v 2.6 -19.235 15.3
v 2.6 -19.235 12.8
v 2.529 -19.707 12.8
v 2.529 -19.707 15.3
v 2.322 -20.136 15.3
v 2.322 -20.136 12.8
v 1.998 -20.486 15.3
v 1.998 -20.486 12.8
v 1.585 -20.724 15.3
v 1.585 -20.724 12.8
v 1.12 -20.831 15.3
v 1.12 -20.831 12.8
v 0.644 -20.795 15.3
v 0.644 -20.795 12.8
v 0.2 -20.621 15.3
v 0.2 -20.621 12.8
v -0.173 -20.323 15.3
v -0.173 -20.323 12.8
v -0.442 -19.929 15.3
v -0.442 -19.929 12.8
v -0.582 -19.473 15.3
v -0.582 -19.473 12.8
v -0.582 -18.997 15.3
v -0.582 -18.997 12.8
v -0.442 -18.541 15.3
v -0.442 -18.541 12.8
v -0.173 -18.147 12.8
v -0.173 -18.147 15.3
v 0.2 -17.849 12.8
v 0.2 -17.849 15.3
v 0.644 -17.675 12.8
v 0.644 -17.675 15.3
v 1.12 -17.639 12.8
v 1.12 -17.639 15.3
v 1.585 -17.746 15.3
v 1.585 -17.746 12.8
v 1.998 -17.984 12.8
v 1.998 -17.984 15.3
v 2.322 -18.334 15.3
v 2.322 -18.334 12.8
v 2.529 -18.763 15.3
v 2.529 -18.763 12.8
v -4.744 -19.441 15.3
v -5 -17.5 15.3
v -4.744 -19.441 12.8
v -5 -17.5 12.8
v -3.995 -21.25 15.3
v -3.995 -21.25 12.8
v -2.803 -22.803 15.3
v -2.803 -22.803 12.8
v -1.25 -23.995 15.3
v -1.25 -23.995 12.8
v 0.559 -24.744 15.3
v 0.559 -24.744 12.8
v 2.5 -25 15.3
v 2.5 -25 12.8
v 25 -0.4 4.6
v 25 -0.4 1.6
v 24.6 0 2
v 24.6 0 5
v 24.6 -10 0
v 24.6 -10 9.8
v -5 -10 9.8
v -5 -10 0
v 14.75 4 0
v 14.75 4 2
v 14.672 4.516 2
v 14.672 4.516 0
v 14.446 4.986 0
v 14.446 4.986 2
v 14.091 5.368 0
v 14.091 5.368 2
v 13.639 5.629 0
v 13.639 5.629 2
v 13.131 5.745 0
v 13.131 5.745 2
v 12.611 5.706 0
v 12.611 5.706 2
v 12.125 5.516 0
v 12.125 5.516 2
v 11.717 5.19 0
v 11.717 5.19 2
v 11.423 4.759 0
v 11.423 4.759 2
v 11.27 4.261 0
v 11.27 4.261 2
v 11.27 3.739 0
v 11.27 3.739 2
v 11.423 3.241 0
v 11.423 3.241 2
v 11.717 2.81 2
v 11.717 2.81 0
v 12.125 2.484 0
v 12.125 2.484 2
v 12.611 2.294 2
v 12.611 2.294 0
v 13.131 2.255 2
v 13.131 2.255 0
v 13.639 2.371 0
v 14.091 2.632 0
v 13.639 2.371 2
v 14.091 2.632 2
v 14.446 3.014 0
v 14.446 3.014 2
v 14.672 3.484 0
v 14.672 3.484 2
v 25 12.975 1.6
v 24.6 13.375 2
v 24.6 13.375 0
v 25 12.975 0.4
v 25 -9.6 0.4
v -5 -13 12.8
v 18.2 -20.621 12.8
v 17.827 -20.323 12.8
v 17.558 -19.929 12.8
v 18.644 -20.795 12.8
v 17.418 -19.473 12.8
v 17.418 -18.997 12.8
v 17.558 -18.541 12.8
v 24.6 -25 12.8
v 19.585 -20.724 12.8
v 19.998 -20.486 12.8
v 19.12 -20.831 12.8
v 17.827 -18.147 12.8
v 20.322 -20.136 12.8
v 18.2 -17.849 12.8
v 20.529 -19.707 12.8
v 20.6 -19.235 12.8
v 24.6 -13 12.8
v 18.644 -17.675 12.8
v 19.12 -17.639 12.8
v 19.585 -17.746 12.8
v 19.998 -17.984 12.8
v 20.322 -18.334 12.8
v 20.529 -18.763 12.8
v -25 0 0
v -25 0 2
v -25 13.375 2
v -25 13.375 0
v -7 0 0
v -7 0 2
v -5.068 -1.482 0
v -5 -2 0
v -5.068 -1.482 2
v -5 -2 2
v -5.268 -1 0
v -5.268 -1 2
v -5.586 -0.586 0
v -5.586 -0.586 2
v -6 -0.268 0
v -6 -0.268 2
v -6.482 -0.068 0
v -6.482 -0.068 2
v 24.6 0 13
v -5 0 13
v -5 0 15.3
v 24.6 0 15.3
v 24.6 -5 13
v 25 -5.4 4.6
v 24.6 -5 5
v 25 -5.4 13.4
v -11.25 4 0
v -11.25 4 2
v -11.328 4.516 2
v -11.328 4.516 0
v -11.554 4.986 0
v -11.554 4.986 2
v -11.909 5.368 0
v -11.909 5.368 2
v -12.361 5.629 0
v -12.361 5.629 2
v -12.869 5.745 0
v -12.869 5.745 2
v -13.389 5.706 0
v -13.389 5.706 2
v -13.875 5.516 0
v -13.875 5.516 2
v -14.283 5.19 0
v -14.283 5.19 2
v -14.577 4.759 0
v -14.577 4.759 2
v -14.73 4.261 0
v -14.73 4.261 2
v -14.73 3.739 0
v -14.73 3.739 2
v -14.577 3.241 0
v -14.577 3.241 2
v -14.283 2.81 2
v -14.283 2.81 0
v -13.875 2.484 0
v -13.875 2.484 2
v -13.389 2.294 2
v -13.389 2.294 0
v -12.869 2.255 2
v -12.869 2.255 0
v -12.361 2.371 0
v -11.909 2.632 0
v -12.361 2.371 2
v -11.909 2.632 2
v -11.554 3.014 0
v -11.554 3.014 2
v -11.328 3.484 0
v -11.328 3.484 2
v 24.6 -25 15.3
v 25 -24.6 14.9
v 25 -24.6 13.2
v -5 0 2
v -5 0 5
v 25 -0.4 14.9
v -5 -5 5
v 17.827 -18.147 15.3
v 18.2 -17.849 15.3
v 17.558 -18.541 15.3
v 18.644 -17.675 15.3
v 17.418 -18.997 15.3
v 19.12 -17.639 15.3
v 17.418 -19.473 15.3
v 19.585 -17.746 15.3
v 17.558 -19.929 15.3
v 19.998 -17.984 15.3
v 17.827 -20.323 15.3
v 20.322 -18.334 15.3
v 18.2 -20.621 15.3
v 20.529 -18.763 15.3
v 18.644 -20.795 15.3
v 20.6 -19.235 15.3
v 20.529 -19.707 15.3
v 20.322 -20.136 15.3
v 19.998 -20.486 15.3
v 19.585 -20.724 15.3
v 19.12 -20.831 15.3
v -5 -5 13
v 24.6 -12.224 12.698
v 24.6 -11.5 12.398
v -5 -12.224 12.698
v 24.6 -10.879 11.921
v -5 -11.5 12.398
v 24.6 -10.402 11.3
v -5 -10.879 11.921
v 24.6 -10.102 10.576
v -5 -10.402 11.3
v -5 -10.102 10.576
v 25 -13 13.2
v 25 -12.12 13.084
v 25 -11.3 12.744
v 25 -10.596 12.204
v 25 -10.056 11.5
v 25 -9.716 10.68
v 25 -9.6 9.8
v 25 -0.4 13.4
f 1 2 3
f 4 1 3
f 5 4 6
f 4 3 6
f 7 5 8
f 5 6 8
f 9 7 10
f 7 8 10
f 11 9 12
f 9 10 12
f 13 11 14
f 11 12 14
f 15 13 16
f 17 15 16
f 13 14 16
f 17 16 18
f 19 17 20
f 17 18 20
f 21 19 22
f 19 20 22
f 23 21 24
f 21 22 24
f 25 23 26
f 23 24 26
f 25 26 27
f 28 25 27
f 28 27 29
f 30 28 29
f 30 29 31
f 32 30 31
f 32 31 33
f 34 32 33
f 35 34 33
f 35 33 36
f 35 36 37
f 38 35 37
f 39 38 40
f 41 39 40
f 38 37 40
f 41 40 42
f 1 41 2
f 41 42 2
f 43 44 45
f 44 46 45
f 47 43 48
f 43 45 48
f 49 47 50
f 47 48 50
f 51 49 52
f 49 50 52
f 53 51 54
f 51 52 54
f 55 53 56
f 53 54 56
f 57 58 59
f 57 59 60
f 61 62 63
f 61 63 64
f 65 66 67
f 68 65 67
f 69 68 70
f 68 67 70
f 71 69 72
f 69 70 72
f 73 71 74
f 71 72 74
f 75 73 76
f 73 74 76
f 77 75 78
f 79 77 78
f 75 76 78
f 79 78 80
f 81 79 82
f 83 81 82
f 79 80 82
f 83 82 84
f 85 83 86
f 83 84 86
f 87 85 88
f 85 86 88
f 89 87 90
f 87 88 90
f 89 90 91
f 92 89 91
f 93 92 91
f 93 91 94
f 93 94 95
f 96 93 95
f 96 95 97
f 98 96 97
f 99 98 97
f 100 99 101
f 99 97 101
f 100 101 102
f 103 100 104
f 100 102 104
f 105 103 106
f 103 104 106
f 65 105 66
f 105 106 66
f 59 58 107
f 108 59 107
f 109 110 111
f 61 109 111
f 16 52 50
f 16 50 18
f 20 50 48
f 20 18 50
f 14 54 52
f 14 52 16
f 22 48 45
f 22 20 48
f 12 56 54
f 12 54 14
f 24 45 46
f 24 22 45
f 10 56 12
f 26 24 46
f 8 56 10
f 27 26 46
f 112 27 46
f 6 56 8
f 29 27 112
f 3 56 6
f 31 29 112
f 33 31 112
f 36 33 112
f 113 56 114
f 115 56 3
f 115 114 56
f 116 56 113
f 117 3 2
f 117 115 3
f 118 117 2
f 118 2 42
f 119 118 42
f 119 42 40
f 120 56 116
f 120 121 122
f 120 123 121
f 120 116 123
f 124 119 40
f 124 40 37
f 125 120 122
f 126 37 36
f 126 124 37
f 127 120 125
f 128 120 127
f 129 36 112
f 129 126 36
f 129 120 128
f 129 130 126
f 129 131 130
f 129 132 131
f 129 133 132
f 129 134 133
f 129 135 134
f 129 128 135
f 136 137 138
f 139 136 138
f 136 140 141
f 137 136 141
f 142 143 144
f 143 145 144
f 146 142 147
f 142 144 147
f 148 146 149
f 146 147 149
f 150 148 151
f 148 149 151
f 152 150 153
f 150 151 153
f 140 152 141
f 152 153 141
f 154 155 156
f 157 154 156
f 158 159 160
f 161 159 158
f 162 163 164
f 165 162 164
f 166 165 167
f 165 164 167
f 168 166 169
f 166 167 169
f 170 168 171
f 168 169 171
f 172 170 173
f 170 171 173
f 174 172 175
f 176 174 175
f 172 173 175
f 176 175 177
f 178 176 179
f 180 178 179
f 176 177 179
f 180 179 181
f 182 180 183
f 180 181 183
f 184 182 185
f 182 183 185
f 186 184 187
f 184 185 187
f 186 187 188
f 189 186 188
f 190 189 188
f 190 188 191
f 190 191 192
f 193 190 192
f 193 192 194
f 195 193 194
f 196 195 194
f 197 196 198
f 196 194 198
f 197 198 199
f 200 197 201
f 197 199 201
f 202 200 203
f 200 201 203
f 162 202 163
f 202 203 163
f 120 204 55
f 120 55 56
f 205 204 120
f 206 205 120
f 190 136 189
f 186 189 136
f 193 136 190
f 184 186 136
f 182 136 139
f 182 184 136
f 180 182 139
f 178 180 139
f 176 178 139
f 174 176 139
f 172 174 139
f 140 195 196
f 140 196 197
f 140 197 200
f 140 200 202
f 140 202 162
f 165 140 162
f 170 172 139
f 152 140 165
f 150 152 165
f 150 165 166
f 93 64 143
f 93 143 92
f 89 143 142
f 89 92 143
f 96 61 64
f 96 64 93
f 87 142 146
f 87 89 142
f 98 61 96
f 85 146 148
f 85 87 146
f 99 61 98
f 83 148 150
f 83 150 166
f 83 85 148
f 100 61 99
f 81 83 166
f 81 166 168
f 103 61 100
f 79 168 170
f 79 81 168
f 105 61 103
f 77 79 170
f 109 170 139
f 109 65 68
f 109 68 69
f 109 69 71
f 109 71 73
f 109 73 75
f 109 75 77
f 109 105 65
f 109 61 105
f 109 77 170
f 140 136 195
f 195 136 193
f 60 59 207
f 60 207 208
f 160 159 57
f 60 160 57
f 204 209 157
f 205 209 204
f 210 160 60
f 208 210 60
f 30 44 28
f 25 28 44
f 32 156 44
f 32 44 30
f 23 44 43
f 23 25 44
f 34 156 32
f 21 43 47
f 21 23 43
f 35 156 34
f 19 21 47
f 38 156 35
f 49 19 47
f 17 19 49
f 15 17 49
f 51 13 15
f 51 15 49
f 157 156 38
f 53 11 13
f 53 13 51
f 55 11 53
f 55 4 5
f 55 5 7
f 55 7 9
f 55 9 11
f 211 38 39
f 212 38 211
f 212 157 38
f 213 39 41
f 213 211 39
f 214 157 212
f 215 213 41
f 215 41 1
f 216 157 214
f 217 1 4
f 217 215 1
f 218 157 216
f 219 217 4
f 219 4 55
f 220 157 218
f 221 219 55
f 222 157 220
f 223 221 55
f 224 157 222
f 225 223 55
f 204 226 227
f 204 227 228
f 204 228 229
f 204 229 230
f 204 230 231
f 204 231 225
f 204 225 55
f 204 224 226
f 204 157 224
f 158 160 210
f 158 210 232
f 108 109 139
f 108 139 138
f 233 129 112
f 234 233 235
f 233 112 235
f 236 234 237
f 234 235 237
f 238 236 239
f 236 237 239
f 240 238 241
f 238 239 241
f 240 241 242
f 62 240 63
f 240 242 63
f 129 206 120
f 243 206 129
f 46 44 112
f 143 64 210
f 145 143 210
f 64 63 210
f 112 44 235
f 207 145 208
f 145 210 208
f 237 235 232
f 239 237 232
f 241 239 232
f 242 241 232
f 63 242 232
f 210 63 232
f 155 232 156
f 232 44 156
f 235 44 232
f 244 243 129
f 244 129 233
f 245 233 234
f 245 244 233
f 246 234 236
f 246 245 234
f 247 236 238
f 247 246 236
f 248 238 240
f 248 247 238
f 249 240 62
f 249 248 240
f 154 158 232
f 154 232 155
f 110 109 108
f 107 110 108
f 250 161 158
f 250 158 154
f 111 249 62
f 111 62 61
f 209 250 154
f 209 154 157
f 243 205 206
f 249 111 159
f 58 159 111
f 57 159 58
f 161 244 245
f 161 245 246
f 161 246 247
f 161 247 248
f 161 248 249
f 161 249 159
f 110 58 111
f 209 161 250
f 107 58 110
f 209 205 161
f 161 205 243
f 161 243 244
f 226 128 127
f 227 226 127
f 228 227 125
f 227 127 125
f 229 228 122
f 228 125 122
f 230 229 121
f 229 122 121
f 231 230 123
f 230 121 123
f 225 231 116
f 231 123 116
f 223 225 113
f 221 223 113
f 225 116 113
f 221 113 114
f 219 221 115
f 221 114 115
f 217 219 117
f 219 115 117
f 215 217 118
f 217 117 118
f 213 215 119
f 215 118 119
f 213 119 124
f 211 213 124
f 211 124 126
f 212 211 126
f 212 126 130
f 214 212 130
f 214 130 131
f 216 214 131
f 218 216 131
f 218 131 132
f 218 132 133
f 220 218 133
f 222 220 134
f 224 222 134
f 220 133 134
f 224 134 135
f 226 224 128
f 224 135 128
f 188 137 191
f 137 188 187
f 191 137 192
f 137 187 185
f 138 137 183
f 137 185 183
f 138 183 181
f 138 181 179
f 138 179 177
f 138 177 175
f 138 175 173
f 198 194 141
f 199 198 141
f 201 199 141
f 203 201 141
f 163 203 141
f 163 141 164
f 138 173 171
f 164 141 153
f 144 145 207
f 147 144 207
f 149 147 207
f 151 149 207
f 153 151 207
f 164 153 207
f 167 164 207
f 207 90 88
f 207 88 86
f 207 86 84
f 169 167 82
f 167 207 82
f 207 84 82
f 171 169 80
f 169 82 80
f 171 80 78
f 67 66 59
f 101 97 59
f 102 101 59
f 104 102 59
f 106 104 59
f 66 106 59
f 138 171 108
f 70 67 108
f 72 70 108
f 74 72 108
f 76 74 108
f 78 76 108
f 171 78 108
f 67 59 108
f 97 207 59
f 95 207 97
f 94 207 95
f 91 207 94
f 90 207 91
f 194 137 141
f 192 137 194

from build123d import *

# Parameters (mm, degrees)
F0_W     = 13.375
F0_H     = 2
F1_DEPTH = 25
F2_R     = 1.75
F3_DEPTH = 2
F5_DEPTH = 30
F6_W     = 5
F6_H     = 8
F7_DEPTH = 50.001
F8_R     = 1.6
F9_DEPTH = 2.5
F10_R    = 7.5
F11_R    = 3
F12_R    = 2
F13_SIZE = 0.4


with BuildPart() as f1:
    # F0 (on Right) → F1 (new body, symmetric)
    with BuildSketch(Plane.YZ):
        with Locations((6.6875, 1)):
            Rectangle(F0_W, F0_H)
    extrude(amount=F1_DEPTH, both=True)

    # F2 (on face) → F3 (cut, through all)
    with BuildSketch(Plane.XY.offset(2)):
        with Locations((-13, 4)):
            Circle(F2_R)
        with Locations((13, 4)):
            Circle(F2_R)
    extrude(amount=-F3_DEPTH, mode=Mode.SUBTRACT)

    # F4 (on face) → F5 (join)
    with BuildSketch(Plane.YZ.offset(25)):
        Polygon((-10, 0), (0, 0), (0, 15.3), (-25, 15.3), (-25, 12.8), (-10, 12.8), align=None)
    extrude(amount=-F5_DEPTH)

    # F6 (on face) → F7 (cut, through all)
    with BuildSketch(Plane.YZ.offset(25)):
        with Locations((-2.5, 9)):
            Rectangle(F6_W, F6_H)
    extrude(amount=-F7_DEPTH, mode=Mode.SUBTRACT)

    # F8 (on face) → F9 (cut, through all)
    with BuildSketch(Plane(origin=(0, 0, 12.8), x_dir=(1, 0, 0), z_dir=(0, 0, -1))):
        with Locations((1, 19.235)):
            Circle(F8_R)
        with Locations((19, 19.235)):
            Circle(F8_R)
    extrude(amount=-F9_DEPTH, mode=Mode.SUBTRACT)

    # F10
    f10_edges = [f1.edges().sort_by_distance(p)[0] for p in [
        (-5, -25, 14.05),
    ]]
    fillet(f10_edges, radius=F10_R)

    # F11
    f11_edges = [f1.edges().sort_by_distance(p)[0] for p in [
        (10, -10, 12.8),
    ]]
    fillet(f11_edges, radius=F11_R)

    # F12
    f12_edges = [f1.edges().sort_by_distance(p)[0] for p in [
        (-5, 0, 1),
    ]]
    fillet(f12_edges, radius=F12_R)

    # F13
    f13_edges = [f1.edges().sort_by_distance(p)[0] for p in [
        (25, -10, 4.9),
        (25, -10.87868, 11.92132),
        (25, 1.6875, 0),
        (25, -19, 12.8),
        (25, 13.375, 1),
        (25, -25, 14.05),
        (25, 6.6875, 2),
        (25, -12.5, 15.3),
        (25, 0, 3.5),
        (25, 0, 14.15),
        (25, -2.5, 5),
        (25, -2.5, 13),
        (25, -5, 9),
    ]]
    chamfer(f13_edges, length=F13_SIZE)


solid = f1.part
